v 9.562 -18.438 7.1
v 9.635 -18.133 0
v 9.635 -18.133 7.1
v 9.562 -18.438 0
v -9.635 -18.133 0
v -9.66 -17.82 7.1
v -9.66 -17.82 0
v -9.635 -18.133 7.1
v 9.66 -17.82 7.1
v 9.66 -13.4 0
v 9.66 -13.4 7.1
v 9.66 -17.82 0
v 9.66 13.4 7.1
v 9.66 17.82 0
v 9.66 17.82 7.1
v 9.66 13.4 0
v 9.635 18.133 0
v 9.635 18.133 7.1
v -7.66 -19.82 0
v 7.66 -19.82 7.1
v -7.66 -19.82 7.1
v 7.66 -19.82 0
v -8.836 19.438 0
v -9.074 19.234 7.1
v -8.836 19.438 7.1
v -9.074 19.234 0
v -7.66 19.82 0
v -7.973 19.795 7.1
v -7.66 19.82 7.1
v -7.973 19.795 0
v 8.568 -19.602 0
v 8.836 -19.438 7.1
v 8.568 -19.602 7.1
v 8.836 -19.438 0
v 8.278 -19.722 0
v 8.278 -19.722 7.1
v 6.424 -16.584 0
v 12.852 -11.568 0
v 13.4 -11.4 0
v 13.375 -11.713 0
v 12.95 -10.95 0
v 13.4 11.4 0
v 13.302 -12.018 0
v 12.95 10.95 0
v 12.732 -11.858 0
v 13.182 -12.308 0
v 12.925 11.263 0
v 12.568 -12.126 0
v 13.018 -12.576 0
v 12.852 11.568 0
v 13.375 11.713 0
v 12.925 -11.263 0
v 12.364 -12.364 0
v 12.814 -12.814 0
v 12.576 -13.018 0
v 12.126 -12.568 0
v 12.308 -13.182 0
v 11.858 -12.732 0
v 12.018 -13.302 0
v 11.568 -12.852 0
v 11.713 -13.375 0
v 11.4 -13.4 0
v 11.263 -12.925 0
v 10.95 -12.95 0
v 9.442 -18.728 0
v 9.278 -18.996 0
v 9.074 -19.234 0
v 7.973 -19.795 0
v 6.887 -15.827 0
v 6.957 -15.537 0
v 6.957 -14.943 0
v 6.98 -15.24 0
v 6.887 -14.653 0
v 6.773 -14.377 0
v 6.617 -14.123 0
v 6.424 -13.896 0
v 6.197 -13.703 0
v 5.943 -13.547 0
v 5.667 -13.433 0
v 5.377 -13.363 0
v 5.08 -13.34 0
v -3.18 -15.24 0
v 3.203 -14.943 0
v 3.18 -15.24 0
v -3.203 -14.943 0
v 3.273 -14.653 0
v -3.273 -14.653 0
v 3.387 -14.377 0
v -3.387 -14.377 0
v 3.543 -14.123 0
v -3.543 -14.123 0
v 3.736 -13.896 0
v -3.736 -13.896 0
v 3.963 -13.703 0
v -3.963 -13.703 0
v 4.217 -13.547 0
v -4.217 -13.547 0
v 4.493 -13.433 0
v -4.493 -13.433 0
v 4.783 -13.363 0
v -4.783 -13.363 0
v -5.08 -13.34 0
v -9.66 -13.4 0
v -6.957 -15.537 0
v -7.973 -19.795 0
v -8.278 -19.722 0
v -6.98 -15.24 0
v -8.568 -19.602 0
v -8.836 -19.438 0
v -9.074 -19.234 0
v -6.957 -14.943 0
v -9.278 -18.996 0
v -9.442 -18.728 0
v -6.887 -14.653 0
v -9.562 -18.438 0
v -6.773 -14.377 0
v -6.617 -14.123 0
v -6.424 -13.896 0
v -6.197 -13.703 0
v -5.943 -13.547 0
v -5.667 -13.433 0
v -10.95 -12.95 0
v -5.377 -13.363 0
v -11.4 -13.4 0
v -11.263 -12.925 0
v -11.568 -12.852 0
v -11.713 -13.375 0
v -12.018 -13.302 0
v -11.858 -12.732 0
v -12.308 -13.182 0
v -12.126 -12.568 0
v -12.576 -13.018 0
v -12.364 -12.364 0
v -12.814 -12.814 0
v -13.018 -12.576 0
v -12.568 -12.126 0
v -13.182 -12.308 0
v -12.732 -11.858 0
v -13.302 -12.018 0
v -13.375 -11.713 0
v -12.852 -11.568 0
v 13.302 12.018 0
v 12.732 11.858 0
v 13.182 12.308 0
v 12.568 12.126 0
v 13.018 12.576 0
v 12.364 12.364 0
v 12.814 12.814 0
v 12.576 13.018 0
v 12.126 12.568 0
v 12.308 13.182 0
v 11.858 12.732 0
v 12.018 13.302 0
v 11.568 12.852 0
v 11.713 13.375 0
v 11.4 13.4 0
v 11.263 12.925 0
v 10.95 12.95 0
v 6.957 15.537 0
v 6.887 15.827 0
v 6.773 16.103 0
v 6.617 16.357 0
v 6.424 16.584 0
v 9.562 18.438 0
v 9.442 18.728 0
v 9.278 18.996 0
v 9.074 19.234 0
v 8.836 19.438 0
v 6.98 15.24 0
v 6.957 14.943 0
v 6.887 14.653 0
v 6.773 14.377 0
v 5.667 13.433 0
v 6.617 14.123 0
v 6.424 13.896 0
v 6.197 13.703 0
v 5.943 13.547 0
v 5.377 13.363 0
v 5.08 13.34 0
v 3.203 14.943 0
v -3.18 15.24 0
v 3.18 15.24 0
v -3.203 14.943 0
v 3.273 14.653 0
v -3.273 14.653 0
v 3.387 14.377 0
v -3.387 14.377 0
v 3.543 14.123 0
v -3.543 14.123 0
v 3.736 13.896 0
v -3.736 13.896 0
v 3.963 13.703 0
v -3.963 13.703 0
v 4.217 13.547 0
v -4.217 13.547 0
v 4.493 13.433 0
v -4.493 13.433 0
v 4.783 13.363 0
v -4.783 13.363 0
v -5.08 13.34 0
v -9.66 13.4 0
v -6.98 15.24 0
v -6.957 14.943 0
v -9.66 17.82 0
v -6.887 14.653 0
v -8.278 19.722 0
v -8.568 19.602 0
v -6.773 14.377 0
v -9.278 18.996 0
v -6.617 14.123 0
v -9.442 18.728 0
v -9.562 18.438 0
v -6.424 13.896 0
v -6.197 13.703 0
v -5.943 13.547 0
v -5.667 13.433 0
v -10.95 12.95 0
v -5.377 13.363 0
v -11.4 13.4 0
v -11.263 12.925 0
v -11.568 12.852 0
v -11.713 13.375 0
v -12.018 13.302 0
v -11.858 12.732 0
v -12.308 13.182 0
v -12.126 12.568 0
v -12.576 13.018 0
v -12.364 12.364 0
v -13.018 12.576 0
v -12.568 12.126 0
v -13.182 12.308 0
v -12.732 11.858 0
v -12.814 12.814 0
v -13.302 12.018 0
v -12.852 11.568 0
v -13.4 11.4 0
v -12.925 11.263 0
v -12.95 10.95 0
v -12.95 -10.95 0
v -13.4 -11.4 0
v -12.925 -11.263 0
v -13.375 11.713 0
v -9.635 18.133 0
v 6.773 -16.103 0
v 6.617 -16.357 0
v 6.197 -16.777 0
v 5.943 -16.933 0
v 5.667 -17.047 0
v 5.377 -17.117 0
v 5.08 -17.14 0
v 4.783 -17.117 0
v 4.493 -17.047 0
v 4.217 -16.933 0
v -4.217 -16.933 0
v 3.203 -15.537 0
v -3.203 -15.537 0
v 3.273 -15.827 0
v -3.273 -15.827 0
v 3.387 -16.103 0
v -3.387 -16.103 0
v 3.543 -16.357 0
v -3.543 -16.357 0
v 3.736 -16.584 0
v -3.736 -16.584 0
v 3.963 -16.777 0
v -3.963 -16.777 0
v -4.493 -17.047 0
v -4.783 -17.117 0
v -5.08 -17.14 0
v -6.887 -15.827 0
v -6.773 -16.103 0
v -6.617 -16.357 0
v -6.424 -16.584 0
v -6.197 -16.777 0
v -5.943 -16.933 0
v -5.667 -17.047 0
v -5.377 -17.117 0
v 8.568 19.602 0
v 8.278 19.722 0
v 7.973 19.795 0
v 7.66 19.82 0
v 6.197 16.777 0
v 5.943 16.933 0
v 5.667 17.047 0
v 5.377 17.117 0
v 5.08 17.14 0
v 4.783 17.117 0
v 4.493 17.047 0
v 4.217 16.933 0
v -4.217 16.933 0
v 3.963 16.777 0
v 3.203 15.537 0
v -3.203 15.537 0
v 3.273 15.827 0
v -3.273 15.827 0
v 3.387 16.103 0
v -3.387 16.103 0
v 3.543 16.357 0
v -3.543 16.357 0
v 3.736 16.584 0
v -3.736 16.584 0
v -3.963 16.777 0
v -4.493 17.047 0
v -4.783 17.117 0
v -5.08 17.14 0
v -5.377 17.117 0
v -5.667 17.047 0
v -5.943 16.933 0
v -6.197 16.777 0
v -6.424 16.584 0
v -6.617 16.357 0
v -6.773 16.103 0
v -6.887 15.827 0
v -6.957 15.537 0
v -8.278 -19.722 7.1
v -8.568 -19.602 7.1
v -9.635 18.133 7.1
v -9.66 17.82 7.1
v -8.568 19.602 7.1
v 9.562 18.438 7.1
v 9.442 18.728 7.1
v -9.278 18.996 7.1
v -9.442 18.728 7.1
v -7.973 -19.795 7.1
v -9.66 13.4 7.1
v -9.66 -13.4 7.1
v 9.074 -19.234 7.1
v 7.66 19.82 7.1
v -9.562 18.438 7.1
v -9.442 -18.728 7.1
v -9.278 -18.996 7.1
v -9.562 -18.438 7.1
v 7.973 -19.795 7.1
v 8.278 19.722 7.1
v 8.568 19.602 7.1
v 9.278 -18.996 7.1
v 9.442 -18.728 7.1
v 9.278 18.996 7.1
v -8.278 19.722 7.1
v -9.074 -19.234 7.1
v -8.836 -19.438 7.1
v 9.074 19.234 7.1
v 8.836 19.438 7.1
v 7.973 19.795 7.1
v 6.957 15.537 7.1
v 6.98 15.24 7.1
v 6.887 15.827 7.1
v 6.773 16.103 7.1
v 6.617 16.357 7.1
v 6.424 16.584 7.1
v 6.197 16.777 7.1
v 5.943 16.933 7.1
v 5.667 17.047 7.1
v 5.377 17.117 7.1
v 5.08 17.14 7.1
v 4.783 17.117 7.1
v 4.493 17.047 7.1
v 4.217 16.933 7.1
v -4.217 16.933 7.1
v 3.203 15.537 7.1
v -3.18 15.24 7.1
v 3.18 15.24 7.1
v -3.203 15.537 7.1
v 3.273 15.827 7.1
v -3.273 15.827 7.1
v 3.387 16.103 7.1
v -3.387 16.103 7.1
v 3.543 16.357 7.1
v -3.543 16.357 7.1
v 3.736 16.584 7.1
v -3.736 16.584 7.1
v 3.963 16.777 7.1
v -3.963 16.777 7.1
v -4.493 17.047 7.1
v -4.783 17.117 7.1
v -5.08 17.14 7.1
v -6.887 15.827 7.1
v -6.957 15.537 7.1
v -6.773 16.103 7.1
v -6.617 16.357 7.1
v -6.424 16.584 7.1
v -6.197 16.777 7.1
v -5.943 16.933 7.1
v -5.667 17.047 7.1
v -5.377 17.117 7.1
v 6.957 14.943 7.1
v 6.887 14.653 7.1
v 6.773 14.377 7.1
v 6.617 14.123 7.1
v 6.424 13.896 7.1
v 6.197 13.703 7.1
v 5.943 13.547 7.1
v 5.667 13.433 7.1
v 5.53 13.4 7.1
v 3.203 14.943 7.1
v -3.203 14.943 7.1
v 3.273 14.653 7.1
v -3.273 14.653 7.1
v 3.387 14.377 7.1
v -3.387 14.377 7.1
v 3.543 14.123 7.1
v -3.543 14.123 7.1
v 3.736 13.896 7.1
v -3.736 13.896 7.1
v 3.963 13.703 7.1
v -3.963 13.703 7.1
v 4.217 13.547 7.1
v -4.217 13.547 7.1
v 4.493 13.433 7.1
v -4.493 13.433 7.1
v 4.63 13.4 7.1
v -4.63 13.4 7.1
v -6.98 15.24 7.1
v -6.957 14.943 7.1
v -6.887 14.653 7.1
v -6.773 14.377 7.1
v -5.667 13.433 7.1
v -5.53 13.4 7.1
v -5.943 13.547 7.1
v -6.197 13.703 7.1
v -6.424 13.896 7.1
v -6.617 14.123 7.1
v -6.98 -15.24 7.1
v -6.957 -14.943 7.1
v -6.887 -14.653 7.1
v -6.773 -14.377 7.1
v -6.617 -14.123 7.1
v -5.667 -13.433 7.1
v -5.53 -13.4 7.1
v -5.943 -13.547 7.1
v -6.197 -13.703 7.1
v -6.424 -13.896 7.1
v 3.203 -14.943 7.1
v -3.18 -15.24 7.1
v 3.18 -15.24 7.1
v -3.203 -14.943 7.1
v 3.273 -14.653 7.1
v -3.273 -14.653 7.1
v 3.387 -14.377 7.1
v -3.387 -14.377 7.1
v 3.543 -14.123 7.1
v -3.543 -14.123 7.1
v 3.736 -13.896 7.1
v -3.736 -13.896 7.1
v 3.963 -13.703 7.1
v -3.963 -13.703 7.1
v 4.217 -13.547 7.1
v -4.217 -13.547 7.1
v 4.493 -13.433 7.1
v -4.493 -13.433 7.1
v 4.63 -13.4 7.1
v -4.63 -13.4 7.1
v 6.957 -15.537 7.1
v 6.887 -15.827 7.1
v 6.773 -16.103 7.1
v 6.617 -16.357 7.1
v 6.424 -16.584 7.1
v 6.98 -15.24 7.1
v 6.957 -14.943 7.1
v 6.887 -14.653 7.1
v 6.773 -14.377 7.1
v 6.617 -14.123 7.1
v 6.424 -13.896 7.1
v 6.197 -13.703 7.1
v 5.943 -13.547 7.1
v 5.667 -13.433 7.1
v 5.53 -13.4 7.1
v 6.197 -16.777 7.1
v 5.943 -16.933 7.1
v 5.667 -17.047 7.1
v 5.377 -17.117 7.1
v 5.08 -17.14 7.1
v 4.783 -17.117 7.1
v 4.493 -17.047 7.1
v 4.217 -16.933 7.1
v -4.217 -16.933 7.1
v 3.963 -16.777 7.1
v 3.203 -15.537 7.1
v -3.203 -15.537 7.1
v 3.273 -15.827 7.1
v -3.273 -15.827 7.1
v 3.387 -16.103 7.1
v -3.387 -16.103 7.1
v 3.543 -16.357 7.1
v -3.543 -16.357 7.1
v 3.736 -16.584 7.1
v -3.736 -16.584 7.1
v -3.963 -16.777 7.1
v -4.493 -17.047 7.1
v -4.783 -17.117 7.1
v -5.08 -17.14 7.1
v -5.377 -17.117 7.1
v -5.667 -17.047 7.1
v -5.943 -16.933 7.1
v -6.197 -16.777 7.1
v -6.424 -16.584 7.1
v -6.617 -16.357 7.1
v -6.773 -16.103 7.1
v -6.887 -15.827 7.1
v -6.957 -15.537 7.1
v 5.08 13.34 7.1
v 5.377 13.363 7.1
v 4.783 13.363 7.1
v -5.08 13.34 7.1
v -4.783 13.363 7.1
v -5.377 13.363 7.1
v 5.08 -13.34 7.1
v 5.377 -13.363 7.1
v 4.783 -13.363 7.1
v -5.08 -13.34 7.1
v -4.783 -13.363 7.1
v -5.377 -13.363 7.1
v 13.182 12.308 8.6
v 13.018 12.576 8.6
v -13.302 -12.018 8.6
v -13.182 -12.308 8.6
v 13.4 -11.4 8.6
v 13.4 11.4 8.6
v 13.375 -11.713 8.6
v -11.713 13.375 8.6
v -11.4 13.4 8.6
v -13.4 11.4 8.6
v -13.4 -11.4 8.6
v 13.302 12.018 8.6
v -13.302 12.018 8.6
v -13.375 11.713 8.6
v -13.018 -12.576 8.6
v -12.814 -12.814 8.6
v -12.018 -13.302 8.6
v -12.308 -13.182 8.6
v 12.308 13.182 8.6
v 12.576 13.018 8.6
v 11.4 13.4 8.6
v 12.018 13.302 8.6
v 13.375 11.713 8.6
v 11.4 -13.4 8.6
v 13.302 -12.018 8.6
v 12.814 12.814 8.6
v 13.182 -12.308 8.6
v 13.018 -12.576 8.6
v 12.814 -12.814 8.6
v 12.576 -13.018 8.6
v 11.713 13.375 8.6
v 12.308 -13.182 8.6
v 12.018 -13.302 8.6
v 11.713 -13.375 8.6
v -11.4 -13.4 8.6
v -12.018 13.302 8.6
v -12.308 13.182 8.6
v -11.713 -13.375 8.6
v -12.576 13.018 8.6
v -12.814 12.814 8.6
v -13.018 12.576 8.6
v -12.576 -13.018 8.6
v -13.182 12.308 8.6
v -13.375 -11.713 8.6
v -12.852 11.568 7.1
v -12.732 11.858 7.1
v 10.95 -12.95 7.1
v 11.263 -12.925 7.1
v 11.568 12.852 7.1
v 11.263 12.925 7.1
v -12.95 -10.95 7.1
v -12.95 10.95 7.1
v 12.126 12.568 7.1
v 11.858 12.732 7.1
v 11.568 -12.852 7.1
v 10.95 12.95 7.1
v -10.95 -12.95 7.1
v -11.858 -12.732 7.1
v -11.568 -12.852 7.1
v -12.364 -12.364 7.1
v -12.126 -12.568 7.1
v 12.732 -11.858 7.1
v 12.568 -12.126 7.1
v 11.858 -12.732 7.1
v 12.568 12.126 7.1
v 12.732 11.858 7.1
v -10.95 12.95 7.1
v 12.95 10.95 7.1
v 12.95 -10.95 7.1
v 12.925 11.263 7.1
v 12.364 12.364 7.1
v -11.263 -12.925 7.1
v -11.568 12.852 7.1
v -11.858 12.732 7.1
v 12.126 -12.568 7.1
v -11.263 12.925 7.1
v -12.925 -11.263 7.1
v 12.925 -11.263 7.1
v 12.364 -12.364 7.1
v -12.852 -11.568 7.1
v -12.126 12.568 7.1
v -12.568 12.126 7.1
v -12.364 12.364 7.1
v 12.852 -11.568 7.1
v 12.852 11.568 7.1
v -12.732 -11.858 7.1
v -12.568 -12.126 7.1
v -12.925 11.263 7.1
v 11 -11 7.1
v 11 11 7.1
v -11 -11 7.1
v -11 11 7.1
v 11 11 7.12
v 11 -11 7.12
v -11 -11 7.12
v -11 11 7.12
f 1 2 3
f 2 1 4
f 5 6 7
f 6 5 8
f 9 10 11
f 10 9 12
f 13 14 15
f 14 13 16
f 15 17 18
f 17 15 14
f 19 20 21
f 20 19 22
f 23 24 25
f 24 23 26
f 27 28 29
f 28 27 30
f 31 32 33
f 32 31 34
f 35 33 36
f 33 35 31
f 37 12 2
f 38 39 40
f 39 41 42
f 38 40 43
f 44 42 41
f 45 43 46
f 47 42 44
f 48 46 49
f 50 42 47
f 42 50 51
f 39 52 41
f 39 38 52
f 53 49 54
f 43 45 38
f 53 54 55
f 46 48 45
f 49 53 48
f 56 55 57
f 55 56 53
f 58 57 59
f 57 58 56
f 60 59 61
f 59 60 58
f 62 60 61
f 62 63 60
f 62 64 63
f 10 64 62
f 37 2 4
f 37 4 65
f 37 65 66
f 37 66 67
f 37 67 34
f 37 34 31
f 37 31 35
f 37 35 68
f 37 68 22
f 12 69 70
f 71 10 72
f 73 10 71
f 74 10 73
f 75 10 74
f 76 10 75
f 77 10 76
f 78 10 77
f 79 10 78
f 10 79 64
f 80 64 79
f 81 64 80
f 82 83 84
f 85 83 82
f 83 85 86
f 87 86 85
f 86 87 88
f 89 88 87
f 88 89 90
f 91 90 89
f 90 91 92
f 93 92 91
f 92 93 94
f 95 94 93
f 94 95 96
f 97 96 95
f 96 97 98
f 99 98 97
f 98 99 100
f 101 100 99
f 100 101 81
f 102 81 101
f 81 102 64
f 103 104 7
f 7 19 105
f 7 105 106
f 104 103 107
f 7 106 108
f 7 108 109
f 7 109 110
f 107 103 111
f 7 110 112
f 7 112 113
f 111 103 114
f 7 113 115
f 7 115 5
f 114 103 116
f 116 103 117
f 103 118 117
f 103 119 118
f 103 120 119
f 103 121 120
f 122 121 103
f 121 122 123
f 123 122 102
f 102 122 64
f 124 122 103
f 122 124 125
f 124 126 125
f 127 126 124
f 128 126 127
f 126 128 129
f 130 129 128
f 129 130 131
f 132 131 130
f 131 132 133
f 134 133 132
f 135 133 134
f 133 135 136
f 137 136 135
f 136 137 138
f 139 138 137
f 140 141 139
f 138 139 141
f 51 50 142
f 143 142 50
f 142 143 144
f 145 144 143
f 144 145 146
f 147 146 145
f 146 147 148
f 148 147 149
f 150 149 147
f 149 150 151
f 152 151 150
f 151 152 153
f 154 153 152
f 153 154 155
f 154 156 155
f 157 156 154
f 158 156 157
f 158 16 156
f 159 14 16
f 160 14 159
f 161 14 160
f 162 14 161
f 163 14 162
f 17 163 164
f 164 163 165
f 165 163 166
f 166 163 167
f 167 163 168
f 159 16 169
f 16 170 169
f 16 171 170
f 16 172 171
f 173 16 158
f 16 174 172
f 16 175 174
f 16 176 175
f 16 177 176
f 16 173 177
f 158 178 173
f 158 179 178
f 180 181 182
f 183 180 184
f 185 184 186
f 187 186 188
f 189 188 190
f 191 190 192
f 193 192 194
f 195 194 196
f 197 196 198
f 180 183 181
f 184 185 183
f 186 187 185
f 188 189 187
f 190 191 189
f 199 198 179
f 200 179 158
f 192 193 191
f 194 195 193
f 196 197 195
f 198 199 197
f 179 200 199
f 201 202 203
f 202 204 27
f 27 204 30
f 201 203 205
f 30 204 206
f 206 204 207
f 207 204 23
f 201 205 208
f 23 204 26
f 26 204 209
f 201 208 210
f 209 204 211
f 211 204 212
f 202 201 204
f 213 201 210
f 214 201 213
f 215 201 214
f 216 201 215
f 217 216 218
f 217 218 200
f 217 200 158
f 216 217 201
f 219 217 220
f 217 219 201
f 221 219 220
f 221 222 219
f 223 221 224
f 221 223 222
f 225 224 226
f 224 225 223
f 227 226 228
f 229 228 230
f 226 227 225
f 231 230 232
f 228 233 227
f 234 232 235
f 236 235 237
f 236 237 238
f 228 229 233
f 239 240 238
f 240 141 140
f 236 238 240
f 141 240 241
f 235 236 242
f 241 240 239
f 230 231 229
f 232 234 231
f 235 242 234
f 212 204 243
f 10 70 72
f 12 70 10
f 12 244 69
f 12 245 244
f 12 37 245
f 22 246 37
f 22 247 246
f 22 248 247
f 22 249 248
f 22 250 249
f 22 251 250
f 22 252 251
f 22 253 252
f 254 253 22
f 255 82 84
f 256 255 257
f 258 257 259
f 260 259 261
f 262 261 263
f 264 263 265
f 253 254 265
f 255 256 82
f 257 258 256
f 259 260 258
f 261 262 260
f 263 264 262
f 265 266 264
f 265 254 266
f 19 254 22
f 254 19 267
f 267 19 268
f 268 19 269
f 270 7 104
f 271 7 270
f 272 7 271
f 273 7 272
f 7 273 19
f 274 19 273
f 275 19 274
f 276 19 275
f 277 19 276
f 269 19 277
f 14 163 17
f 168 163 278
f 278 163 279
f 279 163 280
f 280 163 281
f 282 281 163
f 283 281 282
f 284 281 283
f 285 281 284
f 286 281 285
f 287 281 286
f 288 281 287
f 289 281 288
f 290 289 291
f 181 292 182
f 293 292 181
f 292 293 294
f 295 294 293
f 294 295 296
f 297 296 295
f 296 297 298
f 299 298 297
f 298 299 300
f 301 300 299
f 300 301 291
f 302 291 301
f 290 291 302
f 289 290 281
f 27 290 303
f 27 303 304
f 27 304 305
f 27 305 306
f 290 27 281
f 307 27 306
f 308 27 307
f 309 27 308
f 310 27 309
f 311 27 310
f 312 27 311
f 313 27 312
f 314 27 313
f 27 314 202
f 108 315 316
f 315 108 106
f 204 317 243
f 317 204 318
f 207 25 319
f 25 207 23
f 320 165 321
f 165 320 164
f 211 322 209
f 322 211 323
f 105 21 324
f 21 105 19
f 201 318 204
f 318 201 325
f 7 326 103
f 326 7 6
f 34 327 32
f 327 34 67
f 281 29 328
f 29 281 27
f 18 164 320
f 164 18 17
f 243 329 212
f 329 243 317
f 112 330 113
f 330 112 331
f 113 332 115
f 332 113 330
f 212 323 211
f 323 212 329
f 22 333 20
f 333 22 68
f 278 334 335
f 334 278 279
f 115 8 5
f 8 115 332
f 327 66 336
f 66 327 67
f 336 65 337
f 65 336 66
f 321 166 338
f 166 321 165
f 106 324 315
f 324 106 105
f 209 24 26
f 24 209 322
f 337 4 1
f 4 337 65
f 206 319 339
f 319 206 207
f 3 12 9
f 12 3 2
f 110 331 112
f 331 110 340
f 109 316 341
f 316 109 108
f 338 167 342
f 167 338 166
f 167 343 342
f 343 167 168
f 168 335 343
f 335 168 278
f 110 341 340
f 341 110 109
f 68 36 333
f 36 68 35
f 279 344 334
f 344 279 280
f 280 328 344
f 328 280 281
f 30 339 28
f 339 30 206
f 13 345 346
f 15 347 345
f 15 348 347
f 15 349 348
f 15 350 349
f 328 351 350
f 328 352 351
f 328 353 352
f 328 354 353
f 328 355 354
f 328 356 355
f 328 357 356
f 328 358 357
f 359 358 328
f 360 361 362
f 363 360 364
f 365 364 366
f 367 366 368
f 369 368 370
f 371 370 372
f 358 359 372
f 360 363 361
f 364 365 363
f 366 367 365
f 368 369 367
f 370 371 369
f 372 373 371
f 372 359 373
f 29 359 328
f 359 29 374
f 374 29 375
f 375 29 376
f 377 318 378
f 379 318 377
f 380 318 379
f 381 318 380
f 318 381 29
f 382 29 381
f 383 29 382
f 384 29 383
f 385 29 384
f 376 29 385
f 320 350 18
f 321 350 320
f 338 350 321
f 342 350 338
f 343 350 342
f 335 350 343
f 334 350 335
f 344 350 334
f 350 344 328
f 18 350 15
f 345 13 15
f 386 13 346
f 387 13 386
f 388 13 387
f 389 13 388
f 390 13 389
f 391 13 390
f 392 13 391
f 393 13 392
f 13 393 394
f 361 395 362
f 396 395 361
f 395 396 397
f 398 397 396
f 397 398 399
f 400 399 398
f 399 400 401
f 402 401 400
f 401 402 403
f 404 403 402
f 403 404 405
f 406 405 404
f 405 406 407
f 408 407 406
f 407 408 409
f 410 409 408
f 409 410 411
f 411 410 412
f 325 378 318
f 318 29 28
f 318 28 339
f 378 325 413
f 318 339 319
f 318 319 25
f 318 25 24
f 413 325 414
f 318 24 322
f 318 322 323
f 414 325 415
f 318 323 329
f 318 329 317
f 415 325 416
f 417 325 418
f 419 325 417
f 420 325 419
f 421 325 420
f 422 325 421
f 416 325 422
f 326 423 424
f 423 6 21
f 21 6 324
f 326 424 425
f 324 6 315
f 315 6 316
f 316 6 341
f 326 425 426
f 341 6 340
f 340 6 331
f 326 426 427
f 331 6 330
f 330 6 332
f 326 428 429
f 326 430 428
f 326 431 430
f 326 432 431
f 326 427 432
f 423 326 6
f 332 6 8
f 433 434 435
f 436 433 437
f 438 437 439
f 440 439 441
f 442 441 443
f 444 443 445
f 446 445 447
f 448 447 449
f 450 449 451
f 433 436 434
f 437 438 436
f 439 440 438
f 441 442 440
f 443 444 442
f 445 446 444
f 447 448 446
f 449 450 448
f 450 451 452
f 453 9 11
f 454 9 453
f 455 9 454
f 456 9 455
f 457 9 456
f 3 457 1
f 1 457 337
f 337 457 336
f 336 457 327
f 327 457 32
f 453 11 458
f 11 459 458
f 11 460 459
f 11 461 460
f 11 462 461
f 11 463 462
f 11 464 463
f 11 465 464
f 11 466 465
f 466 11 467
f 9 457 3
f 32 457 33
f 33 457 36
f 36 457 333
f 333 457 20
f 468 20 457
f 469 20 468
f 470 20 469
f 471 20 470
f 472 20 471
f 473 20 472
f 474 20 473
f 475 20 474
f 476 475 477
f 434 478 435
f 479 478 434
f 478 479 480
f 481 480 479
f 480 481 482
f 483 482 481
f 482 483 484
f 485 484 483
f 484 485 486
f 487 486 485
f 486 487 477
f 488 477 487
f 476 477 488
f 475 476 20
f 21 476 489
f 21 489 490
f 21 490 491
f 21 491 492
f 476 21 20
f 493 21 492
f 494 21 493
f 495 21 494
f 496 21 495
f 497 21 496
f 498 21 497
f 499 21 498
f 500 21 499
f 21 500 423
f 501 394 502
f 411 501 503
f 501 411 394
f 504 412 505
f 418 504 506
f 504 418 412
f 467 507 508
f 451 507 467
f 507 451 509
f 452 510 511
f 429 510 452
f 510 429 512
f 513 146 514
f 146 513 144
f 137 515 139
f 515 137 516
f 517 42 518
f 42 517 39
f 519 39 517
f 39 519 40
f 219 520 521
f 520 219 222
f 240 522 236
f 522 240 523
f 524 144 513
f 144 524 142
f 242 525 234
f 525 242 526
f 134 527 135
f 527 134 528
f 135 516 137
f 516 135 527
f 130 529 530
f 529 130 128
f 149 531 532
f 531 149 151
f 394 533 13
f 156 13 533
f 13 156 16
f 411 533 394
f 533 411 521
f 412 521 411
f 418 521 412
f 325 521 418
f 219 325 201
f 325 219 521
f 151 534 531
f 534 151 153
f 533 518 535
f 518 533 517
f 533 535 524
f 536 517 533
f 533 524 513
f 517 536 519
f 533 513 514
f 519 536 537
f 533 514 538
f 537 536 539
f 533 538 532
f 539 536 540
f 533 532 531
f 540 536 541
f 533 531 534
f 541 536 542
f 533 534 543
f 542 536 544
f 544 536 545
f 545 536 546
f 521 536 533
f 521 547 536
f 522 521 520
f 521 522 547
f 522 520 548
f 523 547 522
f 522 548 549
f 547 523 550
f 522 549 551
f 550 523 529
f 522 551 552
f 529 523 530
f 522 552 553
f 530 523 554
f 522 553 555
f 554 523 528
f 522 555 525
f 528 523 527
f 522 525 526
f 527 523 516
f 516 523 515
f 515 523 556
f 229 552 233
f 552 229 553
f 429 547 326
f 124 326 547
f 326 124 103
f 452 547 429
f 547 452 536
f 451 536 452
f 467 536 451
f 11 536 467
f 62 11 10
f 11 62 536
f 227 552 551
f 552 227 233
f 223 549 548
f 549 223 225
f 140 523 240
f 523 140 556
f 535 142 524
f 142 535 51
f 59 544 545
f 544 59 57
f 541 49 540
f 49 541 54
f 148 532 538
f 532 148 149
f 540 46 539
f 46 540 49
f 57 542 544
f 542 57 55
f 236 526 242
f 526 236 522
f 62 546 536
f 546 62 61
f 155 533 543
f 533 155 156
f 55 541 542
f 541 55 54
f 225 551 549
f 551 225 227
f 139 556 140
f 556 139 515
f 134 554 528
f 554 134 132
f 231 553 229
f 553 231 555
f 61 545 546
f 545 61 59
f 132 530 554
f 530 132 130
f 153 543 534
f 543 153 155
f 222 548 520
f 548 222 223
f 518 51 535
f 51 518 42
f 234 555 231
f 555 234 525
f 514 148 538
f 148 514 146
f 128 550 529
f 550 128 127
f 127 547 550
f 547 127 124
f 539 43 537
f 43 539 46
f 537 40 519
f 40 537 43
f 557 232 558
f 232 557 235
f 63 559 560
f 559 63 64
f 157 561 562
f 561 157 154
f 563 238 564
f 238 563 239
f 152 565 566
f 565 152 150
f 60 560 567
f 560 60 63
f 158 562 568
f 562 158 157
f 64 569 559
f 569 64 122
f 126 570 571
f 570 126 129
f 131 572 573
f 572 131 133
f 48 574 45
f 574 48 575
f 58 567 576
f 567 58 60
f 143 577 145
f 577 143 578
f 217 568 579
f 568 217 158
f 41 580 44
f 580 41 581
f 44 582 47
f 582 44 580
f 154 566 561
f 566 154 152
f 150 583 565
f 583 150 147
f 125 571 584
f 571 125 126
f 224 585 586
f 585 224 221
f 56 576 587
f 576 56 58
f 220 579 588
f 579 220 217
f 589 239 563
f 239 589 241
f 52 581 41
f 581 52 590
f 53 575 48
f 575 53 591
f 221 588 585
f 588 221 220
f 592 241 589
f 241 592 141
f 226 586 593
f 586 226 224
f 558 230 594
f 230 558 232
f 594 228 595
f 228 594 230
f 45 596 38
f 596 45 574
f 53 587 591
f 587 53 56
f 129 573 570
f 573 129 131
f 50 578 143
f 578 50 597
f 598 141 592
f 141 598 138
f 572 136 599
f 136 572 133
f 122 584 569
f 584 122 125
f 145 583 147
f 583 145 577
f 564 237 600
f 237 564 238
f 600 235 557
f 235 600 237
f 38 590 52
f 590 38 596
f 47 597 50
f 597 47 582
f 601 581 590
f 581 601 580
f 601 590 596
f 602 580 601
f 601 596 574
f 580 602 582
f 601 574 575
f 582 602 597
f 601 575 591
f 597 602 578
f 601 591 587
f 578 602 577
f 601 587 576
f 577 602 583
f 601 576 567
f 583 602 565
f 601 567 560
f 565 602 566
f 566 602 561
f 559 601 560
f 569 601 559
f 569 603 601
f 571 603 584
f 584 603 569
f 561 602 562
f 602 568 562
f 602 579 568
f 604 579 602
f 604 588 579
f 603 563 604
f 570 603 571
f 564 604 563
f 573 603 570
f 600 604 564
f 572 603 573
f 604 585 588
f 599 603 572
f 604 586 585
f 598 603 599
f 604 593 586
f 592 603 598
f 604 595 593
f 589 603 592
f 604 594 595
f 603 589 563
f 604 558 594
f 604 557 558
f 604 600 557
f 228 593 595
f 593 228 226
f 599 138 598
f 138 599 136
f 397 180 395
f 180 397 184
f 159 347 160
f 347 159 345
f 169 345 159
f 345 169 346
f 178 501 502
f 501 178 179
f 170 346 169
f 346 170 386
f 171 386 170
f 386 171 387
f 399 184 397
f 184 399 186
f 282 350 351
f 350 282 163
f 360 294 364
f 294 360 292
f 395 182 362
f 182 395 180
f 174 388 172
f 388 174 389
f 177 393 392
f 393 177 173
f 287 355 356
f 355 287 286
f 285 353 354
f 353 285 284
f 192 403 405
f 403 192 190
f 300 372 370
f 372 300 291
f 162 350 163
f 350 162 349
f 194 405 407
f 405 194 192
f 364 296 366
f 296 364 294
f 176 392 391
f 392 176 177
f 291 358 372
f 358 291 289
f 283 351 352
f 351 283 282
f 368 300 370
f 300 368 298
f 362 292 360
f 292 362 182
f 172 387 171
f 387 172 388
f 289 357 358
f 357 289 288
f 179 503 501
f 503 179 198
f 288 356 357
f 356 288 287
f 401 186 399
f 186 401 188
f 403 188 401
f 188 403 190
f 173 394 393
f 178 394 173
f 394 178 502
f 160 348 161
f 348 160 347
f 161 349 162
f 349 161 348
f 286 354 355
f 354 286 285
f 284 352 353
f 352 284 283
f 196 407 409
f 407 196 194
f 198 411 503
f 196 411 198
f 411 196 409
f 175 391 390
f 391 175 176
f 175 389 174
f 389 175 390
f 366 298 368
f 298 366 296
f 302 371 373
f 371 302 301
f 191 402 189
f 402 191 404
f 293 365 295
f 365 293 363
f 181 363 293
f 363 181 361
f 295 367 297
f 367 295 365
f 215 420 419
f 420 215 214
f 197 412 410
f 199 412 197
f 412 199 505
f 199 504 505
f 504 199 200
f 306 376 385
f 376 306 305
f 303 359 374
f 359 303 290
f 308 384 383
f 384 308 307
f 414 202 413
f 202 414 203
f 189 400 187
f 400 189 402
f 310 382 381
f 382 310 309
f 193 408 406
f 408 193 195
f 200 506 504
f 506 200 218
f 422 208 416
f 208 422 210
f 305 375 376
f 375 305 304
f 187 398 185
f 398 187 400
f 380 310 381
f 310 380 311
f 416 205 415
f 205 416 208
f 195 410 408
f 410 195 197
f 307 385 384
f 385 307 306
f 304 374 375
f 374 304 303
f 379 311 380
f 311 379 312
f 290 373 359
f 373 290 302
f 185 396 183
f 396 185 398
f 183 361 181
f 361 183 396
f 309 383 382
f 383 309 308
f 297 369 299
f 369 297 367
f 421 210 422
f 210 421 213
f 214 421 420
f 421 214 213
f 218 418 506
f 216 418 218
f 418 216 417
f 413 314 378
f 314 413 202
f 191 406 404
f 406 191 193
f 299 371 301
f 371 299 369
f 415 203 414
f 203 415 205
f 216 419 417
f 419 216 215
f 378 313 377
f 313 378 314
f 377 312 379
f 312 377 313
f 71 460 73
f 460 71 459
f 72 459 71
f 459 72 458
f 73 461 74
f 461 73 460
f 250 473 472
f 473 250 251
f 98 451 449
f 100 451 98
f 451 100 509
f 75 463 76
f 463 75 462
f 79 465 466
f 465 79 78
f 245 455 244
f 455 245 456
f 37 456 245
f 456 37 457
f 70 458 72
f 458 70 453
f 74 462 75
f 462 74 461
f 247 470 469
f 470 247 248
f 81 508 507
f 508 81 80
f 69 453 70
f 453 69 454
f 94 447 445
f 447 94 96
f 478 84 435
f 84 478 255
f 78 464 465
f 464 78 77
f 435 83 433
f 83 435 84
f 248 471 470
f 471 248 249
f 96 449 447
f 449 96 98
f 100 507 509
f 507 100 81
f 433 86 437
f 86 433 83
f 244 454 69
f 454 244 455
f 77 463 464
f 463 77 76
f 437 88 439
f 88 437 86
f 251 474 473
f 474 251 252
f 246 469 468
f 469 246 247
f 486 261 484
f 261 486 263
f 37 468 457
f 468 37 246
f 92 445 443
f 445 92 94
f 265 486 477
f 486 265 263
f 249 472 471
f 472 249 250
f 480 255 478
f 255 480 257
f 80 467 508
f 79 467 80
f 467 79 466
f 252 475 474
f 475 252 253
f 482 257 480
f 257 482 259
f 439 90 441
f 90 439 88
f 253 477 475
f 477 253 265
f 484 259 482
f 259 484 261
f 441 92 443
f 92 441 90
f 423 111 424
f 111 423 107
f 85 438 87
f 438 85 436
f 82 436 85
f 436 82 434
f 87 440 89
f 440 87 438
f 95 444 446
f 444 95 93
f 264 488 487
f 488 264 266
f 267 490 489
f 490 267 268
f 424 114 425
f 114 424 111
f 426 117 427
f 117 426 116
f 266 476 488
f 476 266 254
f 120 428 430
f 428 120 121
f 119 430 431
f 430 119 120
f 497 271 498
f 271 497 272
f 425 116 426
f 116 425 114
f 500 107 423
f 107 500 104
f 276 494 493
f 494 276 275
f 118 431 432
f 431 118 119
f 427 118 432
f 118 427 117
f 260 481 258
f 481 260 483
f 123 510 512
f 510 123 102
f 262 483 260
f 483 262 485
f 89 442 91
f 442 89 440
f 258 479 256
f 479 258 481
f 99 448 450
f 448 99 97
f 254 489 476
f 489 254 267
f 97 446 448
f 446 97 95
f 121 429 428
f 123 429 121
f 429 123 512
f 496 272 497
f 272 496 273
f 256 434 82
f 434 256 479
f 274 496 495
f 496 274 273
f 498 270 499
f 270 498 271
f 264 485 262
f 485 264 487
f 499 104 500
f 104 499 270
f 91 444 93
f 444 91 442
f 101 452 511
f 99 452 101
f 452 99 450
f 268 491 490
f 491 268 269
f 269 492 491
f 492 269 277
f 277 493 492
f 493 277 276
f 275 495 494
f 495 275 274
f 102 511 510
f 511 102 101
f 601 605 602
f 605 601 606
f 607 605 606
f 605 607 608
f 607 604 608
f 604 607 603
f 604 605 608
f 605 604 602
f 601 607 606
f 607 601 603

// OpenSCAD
// file: ../configuration.scad
$fn=40; // model faces resolution.

//OBECNE PARAMETRY 
//----------------------------------------------------------------
//----------------------------------------------------------------

vyska_krystalu=15;
vyska_sipm=2;
presah_krystalu=6;
rezerva_nad_krystalem=5;
vyska_drzaku_krystalu=vyska_krystalu-presah_krystalu-2;

hrana_krystalu=6; //čistá hrana

// big-big
//zakladna_krystalu_x=23.7; //1.5mm rezerva hrana SIPM je 22 mm
//zakladna_krystalu_y=23.7;
// big-small
zakladna_krystalu_x=22.0; //1.5mm rezerva hrana SIPM je 22 mm
zakladna_krystalu_y=22.0;
sila_steny=1.2;
sila_materialu_zakladny=7; //1.6;


vyska_zapusti_pro_PCB=0; //výčka krycího matriálu pro PCB a zároveň pro vytvoření vany pro zalití silikonem, kvůli světlotěsnoti.
vyska_SIPM_nad_PCB=2.4; //výška celého SIPM senzoru
tolerance_pro_dotazeni_k_SIPM=-0.5; // kvůli dotažení krystalu k SIPM
velikost_modulu_x=2; //počet der
velikost_modulu_y=4;
rotec_der_modulu=10.16;

vyska_matky=3;
sirka_matky=6.7;
prumer_sroubu=3.6;//3.4;
prumer_hlavy_sroubu=6;
vyska_hlavy_sroubu=5;

//Pro díl SIPMBOX01C_D02
D02_velikost_modulu_x=3; //počet der
D02_velikost_modulu_y=4;
D02_vyska_bocniho_prekryvu=25;

//Pro díl SIPMBOX01C_D07
D07_vyska=6;
// main file
use <../src/SIPMBOX01C.scad>

include <../configuration.scad>

SIPMBOX01C_D05();
